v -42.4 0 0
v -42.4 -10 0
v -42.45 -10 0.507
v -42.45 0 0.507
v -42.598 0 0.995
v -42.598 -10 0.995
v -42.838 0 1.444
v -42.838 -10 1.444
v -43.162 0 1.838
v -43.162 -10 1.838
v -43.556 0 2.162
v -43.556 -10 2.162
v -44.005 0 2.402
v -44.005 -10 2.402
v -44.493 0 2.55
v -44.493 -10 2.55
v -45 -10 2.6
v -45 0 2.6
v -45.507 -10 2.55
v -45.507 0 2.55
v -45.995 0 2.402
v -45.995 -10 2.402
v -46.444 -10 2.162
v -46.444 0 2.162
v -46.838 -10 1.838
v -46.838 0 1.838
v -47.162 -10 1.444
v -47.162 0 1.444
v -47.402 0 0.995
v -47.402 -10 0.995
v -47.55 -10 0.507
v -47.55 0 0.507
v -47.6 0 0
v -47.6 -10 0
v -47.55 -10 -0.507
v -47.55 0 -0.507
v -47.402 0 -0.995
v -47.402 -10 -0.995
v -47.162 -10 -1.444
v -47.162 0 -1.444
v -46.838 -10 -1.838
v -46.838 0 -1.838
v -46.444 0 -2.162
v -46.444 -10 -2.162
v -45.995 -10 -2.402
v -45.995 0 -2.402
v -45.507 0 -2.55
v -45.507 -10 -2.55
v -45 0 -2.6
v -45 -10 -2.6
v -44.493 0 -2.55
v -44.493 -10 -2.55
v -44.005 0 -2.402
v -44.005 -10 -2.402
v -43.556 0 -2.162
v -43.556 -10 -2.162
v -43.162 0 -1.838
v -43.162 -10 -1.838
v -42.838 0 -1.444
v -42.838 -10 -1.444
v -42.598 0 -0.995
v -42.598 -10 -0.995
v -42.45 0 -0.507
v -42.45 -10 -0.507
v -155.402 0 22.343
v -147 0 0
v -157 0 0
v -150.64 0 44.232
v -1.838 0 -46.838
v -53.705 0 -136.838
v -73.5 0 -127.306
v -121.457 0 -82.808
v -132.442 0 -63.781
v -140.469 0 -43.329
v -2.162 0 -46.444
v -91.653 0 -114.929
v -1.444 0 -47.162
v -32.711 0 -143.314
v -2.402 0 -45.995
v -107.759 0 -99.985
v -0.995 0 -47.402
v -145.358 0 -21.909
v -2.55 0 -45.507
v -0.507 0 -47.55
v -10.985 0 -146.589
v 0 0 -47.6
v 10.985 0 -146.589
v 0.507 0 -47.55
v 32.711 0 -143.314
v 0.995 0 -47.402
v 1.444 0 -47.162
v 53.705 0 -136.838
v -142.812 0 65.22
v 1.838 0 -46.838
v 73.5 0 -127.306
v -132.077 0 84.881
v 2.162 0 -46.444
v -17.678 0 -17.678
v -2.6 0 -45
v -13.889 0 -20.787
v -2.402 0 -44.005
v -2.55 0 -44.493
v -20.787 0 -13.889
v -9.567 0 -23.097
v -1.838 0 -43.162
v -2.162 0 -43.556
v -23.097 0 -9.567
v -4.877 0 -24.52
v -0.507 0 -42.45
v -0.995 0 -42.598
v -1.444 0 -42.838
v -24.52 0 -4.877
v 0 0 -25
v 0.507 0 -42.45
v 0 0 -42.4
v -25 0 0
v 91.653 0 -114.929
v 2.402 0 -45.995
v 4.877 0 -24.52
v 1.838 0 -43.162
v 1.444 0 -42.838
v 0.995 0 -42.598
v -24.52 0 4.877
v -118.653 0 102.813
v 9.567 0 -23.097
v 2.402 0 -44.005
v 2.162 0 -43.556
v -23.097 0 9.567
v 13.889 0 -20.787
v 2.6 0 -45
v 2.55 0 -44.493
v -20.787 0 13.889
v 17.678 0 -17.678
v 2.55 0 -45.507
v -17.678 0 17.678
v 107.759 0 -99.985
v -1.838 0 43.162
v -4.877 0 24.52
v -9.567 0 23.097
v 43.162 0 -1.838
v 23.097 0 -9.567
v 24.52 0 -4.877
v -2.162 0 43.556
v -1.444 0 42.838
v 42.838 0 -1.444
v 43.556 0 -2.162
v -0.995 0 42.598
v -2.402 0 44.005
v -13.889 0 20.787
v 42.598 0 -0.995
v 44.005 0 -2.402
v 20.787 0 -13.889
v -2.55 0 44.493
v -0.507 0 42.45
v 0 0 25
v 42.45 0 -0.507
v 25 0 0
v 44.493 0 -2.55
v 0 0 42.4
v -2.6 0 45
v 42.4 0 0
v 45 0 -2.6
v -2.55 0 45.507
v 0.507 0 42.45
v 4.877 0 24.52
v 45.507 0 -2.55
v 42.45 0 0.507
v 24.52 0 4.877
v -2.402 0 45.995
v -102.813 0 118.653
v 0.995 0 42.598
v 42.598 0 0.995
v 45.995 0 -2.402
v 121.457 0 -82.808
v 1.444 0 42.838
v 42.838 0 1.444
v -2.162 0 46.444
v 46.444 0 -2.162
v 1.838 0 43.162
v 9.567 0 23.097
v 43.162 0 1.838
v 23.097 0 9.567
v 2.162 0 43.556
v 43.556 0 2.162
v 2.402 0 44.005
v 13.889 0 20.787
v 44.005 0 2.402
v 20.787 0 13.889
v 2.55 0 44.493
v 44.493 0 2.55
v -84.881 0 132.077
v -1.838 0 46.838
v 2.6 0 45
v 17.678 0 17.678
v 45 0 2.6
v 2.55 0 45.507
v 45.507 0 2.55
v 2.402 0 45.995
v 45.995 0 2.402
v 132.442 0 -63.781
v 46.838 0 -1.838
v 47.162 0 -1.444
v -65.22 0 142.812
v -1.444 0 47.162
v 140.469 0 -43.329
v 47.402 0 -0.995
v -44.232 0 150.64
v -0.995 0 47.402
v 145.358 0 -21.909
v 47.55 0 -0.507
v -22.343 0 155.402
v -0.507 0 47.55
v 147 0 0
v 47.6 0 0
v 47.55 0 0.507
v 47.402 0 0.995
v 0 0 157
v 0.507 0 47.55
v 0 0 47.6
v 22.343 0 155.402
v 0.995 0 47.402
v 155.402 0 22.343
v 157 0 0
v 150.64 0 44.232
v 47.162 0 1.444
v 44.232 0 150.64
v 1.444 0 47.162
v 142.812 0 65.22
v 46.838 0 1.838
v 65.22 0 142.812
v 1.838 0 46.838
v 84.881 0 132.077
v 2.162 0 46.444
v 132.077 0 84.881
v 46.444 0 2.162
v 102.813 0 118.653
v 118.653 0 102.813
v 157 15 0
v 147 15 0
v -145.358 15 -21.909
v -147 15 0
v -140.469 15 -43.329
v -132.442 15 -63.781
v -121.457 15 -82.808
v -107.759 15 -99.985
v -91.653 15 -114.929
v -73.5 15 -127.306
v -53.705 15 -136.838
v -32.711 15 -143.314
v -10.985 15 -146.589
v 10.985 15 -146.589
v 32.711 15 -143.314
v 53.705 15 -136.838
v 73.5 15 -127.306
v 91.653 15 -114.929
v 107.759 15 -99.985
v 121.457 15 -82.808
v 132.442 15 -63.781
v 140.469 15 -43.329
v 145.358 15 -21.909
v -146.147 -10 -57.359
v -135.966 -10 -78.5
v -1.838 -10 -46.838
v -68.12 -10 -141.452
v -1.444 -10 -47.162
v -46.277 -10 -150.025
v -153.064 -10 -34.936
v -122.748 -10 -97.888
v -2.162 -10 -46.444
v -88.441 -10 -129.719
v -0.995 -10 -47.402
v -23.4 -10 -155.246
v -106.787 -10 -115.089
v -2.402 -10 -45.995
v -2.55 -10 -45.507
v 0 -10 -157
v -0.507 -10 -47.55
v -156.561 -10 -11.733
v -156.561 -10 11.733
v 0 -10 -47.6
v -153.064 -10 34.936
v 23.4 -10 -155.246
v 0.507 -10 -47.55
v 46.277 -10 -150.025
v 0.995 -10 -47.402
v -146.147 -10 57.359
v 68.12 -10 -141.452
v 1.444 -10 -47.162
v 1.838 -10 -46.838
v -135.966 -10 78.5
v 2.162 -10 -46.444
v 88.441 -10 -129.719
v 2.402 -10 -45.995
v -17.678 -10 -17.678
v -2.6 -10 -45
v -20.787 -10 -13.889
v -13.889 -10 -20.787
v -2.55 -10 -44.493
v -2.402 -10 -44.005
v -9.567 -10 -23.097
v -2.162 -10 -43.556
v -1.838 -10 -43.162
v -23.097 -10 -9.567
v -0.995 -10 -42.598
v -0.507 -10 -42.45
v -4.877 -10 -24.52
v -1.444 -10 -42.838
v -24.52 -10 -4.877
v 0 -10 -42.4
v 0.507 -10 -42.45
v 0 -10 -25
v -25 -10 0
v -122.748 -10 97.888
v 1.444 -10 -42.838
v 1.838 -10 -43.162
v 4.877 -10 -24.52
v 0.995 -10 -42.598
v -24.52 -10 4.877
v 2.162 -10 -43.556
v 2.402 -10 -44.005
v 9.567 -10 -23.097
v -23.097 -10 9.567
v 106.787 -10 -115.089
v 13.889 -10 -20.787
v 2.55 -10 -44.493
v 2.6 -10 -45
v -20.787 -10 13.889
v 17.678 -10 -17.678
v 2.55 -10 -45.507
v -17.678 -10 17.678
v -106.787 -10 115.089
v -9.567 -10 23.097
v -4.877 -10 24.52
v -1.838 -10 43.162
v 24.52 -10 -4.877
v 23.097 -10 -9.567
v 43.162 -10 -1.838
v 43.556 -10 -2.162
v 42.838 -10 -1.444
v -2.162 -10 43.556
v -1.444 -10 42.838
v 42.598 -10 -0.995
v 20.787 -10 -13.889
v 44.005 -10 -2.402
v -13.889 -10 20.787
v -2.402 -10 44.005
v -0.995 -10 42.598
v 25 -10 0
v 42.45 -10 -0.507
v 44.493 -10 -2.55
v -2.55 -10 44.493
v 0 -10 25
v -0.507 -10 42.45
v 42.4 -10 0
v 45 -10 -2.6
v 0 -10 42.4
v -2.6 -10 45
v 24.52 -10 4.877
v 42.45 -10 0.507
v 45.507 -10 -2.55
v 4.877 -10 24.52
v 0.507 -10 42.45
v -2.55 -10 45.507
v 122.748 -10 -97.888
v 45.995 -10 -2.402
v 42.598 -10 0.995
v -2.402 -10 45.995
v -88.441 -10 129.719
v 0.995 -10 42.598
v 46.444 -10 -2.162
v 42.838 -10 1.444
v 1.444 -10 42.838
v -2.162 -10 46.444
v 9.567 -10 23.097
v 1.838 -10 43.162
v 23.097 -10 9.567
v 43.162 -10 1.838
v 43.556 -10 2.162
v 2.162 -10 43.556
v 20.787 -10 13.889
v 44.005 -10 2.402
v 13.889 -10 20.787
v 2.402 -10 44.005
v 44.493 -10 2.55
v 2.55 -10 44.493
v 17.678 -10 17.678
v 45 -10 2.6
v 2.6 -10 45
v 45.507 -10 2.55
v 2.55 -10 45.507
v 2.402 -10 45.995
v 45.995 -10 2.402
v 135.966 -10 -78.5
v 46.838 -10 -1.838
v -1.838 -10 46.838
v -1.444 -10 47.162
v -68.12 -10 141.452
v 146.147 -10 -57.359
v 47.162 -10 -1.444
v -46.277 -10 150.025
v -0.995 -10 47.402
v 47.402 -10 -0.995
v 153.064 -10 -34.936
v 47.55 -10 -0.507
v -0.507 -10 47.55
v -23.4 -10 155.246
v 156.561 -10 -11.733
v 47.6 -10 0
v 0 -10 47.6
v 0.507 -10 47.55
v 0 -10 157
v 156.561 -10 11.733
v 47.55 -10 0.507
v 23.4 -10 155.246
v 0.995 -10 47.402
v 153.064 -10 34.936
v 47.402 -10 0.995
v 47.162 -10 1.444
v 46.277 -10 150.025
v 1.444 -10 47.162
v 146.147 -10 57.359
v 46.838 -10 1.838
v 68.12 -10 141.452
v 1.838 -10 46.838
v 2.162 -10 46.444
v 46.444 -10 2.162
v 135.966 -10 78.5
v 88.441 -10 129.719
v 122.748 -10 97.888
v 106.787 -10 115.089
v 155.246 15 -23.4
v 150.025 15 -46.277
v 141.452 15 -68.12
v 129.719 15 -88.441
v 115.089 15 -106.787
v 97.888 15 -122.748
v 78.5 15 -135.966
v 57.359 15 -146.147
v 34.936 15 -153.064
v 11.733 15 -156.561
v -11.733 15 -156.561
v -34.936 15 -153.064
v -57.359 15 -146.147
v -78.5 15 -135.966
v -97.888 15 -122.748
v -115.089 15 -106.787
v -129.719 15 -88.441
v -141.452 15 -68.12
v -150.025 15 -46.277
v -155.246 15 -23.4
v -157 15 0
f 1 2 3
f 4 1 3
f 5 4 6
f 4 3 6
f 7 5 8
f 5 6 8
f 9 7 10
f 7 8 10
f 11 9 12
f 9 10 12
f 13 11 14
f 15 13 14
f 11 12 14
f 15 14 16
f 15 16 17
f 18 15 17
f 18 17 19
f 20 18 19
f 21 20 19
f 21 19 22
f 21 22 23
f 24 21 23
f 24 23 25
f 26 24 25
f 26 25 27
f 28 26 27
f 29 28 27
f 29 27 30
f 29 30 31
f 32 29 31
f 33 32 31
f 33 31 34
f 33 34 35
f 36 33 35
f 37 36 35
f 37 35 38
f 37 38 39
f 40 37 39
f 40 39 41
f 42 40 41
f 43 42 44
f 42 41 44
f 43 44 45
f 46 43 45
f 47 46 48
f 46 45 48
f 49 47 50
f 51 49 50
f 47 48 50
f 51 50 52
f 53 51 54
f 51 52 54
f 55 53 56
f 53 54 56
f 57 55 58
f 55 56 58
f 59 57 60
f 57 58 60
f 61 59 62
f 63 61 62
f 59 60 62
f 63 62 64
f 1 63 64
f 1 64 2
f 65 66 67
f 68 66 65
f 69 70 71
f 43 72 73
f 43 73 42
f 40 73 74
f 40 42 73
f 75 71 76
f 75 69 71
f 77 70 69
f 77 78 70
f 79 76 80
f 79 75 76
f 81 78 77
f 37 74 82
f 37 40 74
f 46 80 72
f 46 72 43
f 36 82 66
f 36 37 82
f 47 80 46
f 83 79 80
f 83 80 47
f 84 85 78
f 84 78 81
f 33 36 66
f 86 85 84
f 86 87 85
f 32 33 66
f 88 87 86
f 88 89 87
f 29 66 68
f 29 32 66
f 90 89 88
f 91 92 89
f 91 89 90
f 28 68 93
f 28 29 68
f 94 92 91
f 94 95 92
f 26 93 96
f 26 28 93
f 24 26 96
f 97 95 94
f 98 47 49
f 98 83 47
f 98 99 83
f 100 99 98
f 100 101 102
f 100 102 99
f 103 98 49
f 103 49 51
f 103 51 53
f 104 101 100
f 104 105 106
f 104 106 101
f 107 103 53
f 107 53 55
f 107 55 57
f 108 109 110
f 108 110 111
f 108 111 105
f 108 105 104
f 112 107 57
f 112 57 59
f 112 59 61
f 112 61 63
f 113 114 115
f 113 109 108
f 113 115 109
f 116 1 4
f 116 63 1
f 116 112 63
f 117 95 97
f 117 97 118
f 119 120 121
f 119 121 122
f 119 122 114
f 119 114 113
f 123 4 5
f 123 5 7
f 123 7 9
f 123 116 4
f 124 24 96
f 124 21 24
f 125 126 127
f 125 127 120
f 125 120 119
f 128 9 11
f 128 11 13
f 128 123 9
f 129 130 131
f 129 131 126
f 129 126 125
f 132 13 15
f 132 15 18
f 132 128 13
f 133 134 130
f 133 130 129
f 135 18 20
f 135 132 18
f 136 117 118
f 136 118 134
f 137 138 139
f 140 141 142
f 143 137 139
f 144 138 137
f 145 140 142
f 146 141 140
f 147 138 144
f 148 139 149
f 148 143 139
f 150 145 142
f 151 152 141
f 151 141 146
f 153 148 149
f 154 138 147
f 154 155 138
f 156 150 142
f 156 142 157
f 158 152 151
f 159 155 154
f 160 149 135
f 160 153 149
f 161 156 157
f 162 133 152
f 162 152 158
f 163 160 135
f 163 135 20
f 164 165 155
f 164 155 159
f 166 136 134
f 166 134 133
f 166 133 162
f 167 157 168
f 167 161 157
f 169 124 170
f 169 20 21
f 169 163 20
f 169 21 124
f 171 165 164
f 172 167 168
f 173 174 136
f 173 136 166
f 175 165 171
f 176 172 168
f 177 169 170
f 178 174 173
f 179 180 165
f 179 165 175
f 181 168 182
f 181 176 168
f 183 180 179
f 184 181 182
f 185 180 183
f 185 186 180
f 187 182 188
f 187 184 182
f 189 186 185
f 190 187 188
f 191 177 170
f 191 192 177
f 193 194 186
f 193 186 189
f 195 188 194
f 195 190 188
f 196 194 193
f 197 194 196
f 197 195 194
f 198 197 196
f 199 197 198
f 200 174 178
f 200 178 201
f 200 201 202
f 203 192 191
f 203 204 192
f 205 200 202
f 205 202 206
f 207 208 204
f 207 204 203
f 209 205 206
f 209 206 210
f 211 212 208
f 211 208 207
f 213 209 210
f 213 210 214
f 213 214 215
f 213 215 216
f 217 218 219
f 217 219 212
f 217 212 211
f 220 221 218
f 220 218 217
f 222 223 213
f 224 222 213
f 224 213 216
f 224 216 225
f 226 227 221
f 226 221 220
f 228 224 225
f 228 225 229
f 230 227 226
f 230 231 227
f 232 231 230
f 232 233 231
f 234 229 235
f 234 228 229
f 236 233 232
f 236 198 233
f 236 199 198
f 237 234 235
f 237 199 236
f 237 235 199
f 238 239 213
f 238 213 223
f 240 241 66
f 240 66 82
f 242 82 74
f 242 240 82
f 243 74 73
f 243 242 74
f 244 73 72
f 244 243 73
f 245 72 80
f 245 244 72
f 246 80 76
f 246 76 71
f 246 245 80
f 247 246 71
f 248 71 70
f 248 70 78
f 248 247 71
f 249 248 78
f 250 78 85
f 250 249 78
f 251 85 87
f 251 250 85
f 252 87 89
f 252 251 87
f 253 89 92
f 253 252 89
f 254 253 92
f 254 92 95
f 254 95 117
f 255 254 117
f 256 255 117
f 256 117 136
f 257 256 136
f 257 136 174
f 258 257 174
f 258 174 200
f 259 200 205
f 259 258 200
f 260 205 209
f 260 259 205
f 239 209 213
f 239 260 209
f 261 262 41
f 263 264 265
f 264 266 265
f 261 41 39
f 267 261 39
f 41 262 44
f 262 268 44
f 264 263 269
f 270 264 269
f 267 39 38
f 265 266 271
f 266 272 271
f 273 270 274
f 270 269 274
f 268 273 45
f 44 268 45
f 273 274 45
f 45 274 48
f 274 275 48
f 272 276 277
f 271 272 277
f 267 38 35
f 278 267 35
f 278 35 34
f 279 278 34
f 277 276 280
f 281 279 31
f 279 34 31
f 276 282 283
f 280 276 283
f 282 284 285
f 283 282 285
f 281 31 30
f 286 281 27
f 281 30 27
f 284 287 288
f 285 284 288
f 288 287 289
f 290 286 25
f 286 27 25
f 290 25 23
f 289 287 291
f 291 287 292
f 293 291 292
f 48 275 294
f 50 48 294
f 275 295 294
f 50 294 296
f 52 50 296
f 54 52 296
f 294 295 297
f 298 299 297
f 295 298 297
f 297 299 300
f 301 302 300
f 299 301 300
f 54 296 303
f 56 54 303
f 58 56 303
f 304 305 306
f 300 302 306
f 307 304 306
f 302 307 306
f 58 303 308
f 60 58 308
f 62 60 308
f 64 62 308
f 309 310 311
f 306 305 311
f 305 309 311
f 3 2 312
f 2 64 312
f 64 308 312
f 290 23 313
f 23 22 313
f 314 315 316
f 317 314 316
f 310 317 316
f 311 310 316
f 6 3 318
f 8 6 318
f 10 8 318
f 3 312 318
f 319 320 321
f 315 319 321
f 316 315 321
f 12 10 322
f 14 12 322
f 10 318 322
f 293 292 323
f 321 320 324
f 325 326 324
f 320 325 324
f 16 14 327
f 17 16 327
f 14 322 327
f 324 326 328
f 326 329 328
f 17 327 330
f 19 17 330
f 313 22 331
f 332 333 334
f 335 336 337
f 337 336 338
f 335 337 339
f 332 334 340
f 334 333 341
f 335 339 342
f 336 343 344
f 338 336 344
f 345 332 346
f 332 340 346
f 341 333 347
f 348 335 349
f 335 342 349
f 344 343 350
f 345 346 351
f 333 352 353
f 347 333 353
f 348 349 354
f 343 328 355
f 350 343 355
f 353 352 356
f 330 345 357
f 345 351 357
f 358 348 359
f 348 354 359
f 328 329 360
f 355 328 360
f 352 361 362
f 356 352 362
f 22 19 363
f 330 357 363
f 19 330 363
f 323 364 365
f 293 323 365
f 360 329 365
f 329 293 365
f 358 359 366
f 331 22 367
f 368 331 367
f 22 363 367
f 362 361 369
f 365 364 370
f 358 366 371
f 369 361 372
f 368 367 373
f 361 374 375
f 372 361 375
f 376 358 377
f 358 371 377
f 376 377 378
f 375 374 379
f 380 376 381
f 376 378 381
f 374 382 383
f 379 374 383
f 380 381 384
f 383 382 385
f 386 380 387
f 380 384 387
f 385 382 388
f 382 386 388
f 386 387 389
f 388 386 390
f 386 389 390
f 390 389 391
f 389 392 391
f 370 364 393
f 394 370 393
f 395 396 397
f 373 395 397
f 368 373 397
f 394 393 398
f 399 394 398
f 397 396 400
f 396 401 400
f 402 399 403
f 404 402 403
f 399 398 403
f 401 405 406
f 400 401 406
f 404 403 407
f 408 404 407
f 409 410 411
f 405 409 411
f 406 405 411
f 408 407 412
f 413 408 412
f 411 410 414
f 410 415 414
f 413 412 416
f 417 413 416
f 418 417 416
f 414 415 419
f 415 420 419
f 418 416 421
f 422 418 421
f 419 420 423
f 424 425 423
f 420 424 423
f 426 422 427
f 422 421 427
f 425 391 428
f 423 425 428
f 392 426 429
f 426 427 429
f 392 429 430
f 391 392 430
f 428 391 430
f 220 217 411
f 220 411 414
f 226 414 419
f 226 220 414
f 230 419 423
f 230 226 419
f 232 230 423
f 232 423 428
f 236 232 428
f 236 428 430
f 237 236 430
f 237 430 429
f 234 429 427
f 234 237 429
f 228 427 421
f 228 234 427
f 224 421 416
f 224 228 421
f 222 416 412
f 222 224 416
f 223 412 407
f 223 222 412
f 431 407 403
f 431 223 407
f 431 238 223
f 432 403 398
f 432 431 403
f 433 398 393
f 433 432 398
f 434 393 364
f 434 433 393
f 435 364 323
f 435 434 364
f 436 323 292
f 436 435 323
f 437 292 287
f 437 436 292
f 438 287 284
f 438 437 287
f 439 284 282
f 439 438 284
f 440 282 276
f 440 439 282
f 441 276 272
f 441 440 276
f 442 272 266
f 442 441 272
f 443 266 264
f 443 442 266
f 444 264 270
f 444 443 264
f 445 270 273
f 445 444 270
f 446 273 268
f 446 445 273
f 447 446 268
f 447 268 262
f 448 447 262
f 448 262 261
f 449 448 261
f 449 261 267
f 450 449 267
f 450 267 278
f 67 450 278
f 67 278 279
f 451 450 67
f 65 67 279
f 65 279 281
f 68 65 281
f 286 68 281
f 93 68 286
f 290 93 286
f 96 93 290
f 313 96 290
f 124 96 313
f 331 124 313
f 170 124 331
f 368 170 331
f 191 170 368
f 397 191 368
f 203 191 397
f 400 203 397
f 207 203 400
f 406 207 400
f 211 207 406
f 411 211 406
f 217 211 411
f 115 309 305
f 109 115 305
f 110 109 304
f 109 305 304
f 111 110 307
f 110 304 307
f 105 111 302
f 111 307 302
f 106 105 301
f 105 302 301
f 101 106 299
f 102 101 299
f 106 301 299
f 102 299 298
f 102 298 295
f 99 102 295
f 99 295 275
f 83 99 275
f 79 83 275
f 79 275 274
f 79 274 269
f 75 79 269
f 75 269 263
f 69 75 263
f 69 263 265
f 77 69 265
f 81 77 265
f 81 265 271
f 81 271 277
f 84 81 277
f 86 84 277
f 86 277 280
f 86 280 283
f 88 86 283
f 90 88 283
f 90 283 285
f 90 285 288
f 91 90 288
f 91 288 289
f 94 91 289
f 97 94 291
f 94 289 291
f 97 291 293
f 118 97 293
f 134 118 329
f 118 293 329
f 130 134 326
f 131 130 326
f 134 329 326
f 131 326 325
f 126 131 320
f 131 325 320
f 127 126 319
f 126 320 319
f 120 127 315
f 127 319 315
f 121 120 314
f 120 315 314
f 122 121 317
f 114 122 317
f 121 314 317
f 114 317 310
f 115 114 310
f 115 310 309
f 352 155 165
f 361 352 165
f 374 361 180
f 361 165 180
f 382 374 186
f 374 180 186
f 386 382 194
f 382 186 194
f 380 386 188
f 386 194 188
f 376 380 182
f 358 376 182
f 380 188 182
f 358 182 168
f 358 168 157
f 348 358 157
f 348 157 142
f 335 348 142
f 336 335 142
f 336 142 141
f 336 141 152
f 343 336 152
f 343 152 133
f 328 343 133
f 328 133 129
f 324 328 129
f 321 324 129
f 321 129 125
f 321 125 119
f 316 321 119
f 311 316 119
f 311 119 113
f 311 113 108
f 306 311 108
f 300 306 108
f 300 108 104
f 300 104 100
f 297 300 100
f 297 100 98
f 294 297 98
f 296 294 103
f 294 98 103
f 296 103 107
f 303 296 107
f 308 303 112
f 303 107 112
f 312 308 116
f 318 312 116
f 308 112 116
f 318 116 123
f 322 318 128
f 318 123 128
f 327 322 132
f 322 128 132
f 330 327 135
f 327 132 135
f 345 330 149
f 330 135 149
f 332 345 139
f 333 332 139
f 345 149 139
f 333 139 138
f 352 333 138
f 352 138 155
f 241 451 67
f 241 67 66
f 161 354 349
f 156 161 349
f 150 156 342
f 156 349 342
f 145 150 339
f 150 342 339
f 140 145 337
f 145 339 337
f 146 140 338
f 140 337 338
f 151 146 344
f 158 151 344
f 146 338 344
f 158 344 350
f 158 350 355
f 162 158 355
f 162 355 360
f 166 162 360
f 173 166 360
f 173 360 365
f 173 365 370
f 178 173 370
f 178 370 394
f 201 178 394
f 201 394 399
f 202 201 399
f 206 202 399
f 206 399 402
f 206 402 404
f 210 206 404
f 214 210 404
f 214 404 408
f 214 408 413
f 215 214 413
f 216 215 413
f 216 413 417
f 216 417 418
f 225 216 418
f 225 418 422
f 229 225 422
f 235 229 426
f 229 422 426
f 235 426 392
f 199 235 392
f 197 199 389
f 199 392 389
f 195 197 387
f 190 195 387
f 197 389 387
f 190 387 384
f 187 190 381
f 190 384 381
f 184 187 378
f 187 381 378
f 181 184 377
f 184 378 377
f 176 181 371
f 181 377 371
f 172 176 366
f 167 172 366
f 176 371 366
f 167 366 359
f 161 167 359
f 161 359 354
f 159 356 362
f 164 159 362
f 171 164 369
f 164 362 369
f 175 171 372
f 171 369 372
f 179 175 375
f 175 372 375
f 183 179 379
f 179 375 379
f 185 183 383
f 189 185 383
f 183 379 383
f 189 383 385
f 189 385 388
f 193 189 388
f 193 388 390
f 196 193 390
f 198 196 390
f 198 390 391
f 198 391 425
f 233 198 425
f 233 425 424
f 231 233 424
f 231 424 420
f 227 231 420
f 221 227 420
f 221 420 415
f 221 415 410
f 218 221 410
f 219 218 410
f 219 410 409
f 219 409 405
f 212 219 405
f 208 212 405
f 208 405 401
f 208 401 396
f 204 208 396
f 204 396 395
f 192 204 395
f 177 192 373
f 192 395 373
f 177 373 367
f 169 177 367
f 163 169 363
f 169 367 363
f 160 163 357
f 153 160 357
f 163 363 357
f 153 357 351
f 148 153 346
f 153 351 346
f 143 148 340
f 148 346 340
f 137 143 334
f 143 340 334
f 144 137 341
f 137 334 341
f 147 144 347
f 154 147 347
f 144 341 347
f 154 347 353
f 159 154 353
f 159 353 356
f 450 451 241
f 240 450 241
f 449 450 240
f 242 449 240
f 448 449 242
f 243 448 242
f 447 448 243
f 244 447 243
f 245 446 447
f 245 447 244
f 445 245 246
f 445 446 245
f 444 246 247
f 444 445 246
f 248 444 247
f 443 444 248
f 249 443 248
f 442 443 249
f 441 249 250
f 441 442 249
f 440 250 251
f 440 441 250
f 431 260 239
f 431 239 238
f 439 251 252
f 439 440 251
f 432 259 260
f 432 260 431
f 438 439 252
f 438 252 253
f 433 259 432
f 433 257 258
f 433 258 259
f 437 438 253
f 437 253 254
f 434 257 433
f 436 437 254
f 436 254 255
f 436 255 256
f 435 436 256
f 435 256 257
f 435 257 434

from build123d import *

# Parameters (mm, degrees)
SKETCH2_R           = 157
BOSS_EXTRUDE1_DEPTH = 10
BOSS_EXTRUDE2_START = 15
BOSS_EXTRUDE2_DEPTH = 15
SKETCH4_R           = 25
CUT_EXTRUDE1_DEPTH  = 223.537637266
SKETCH5_R           = 2.6
CUT_EXTRUDE2_DEPTH  = 224.434554176
CIRPATTERN1_COUNT   = 4


with BuildPart() as part:
    # Sketch2 → Boss-Extrude1 (new body)
    with BuildSketch(Plane(origin=(0, 0, 0), x_dir=(1, 0, 0), z_dir=(0, 1, 0))):
        with Locations(Location((0, 0, 0), (0, 0, 270))):
            Circle(SKETCH2_R)
    extrude(amount=-BOSS_EXTRUDE1_DEPTH)

    # Sketch3 → Boss-Extrude2 (add)
    with BuildSketch(Plane(origin=(0, 0, 0), x_dir=(1, 0, 0), z_dir=(0, 1, 0)).offset(BOSS_EXTRUDE2_START)):
        with BuildLine():
            ThreePointArc((157, 0), (0, 157), (-157, 0))
            Line((-157, 0), (-147, 0))
            ThreePointArc((-147, 0), (0, 147), (147, 0))
            Line((147, 0), (157, 0))
        make_face()
    extrude(amount=-BOSS_EXTRUDE2_DEPTH)

    # Sketch4 → Cut-Extrude1 (cut, through all)
    with BuildSketch(Plane(origin=(0, 0, 0), x_dir=(1, 0, 0), z_dir=(0, 1, 0))):
        with Locations(Location((0, 0, 0), (0, 0, 270))):
            Circle(SKETCH4_R)
    extrude(amount=-CUT_EXTRUDE1_DEPTH, mode=Mode.SUBTRACT)

    # Sketch5 → Cut-Extrude2 (cut, through all)
    with BuildSketch(Plane.XZ.offset(10)):
        with Locations(Location((0, 45, 0), (0, 0, 270))):
            Circle(SKETCH5_R)
    cut_extrude2 = extrude(amount=-CUT_EXTRUDE2_DEPTH, mode=Mode.SUBTRACT)

    # CirPattern1: Cut-Extrude2 ×4 about axis
    cirpattern1_axis = Axis((0, 0, 0), (0, 1, 0))
    for i in range(1, CIRPATTERN1_COUNT):
        add(cut_extrude2.rotate(cirpattern1_axis, i * 360 / CIRPATTERN1_COUNT), mode=Mode.SUBTRACT)


solid = part.part
